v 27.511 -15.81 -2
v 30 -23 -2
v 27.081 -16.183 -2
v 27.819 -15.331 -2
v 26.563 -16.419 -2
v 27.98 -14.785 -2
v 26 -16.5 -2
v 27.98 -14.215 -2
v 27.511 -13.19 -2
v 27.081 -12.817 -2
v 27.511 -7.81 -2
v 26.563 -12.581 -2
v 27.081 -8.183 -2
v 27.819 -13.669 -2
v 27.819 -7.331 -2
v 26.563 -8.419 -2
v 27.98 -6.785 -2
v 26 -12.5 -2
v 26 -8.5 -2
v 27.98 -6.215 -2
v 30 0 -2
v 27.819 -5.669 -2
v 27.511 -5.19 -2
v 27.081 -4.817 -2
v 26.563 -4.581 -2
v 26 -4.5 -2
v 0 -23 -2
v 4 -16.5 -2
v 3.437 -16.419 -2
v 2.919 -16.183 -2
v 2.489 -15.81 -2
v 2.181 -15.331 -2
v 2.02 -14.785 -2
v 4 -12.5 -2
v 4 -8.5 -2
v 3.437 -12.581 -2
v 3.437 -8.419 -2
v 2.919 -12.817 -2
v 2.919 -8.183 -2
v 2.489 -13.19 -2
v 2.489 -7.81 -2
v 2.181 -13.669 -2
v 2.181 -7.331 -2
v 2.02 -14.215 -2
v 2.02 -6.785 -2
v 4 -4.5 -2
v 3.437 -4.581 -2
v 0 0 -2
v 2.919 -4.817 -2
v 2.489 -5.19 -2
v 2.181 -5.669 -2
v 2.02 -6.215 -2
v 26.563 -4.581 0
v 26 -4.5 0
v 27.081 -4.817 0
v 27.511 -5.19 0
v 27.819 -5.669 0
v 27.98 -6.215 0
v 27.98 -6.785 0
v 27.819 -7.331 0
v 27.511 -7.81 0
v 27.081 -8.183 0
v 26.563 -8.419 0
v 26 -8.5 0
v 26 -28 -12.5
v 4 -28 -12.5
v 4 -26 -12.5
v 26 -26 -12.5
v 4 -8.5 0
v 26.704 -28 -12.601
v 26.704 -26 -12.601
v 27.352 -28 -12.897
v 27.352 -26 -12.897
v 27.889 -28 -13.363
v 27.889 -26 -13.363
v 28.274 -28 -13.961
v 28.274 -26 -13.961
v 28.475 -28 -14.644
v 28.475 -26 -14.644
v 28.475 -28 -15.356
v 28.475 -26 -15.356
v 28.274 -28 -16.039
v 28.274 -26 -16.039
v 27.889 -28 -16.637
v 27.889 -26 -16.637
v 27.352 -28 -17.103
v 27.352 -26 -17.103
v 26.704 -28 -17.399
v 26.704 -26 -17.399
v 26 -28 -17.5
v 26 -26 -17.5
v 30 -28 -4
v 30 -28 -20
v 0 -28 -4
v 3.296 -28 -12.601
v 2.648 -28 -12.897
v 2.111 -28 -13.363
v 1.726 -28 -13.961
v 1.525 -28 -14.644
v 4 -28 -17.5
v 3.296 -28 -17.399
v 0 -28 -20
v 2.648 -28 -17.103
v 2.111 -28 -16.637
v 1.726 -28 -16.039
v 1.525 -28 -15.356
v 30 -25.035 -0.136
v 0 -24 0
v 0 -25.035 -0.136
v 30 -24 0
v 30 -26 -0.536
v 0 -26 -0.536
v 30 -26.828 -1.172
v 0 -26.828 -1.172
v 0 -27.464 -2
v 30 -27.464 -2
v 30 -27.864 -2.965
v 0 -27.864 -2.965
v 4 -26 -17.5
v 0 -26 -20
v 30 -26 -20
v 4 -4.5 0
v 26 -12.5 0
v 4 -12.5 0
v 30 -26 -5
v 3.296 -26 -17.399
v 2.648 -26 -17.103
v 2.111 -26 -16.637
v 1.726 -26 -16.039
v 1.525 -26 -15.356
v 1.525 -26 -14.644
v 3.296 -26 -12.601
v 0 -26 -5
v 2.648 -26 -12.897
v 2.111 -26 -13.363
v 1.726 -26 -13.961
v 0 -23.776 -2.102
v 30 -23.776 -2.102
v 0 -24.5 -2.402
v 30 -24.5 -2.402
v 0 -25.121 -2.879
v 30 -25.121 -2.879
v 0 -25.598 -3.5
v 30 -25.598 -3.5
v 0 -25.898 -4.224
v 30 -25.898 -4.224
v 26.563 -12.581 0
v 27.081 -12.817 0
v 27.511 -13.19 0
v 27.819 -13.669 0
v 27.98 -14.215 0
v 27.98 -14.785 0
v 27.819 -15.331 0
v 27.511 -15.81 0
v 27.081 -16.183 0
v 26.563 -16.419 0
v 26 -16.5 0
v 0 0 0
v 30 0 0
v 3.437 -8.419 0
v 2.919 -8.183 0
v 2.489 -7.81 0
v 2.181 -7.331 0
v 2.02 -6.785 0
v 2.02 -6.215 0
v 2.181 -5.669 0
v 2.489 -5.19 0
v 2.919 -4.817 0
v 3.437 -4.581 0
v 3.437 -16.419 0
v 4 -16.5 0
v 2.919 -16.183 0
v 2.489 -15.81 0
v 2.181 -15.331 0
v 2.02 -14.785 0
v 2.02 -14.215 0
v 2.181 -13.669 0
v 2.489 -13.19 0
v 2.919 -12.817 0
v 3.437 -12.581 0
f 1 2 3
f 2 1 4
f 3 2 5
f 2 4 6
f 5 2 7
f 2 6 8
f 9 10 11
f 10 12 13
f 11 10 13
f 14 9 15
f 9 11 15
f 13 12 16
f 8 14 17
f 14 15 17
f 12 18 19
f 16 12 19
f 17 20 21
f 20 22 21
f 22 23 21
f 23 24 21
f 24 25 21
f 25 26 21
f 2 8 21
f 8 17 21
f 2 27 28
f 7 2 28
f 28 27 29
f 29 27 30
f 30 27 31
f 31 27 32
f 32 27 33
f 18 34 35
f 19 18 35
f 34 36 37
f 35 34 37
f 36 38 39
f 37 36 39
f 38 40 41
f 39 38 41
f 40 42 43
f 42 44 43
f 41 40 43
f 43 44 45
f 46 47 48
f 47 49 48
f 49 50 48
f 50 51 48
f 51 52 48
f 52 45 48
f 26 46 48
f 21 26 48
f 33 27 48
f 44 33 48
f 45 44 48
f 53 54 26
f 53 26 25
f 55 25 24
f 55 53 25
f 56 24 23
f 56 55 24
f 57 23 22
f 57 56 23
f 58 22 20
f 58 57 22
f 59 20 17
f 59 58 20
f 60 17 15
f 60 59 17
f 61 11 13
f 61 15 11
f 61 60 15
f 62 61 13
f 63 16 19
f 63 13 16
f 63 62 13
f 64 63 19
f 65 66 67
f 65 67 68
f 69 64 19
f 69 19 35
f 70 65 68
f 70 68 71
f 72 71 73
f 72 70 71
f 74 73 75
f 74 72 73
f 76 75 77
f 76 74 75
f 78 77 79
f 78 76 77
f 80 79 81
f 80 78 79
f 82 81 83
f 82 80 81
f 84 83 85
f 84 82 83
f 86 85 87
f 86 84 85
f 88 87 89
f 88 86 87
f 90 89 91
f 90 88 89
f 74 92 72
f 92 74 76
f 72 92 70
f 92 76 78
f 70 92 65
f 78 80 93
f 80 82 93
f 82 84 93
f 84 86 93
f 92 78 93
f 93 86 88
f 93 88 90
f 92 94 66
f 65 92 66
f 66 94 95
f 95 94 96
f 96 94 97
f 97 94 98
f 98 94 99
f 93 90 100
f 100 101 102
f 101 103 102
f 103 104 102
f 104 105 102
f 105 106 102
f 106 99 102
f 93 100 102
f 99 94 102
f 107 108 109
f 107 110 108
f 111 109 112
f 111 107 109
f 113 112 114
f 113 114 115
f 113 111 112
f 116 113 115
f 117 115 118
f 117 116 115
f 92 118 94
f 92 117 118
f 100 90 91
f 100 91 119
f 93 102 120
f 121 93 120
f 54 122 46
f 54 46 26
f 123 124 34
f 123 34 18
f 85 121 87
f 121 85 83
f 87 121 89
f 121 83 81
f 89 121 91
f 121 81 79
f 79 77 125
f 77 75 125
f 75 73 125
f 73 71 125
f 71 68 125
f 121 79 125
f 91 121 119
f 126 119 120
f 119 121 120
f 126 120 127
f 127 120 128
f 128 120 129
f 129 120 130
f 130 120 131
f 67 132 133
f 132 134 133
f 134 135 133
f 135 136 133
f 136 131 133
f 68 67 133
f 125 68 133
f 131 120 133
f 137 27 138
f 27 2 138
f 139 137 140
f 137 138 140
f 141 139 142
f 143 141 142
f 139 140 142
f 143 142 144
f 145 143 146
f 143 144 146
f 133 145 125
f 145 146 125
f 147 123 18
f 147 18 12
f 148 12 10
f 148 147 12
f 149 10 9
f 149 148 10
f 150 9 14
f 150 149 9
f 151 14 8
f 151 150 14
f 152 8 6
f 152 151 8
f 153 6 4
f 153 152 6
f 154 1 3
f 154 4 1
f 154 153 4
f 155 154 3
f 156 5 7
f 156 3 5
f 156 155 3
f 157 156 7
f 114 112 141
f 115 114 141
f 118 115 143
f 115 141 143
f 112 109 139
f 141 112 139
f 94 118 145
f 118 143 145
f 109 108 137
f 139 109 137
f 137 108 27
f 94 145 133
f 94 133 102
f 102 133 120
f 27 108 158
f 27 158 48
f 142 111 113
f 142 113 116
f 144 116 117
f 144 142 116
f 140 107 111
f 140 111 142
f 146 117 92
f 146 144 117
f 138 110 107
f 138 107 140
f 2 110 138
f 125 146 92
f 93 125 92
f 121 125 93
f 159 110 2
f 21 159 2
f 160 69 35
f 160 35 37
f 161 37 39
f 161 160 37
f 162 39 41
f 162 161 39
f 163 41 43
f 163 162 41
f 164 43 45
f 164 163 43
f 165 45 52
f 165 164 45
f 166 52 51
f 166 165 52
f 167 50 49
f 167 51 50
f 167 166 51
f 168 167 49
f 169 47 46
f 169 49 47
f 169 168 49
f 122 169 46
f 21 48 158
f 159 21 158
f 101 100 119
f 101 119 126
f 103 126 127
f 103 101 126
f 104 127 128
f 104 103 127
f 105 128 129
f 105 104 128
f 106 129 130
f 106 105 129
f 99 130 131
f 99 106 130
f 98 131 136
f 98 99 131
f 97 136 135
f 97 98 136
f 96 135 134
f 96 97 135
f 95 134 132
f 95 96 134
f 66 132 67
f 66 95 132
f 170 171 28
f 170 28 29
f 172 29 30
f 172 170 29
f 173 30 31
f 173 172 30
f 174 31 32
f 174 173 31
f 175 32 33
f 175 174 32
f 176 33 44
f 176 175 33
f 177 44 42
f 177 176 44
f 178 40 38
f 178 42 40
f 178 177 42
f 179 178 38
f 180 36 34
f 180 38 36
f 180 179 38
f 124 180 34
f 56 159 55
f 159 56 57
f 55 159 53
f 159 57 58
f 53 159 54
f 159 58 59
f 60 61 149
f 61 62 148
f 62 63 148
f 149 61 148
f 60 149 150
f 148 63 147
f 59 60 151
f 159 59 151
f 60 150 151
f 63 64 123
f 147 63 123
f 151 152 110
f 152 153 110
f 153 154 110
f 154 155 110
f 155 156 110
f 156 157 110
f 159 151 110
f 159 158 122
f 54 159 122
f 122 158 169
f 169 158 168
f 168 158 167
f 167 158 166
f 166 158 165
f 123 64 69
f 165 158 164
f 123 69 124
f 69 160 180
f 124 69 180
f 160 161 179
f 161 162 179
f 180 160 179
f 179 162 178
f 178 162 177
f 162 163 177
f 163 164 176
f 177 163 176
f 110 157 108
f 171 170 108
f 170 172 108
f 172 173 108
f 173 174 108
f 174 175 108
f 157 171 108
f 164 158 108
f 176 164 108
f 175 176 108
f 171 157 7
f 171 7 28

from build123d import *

# Parameters (mm, degrees)
EXTRUDE_1_DEPTH     = 30
CUT_EXTRUDE_1_DEPTH = 46.650848842
CUT_EXTRUDE_2_DEPTH = 46.650848842
FILLET_2_R          = 4
FILLET_3_R          = 3


with BuildPart() as part:
    # 草图1 → 凸台-拉伸1 (new body)
    with BuildSketch(Plane(origin=(0, 0, 0), x_dir=(0, 0, -1), z_dir=(1, 0, 0))):
        Polygon((0, 0), (0, -17.457543398), (0, -28), (3.576042669, -28), (20, -28), (20, -26), (3.746159887, -26), (2, -26), (2, -18.350485623), (2, 0), align=None)
    extrude(amount=EXTRUDE_1_DEPTH)

    # 草图3 → 切除-拉伸1 (cut, through all)
    with BuildSketch(Plane.XY):
        with BuildLine():
            Line((4, -12.5), (26, -12.5))
            ThreePointArc((26, -12.5), (28, -14.5), (26, -16.5))
            Line((26, -16.5), (4, -16.5))
            ThreePointArc((4, -16.5), (2, -14.5), (4, -12.5))
        make_face()
        with BuildLine():
            Line((4, -4.5), (26, -4.5))
            ThreePointArc((26, -4.5), (28, -6.5), (26, -8.5))
            Line((26, -8.5), (4, -8.5))
            ThreePointArc((4, -8.5), (2, -6.5), (4, -4.5))
        make_face()
    extrude(amount=-CUT_EXTRUDE_1_DEPTH, mode=Mode.SUBTRACT)

    # 草图4 → 切除-拉伸2 (cut, through all)
    with BuildSketch(Plane.XZ.offset(28)):
        with BuildLine():
            Line((4, -12.5), (26, -12.5))
            ThreePointArc((26, -12.5), (28.5, -15), (26, -17.5))
            Line((26, -17.5), (4, -17.5))
            ThreePointArc((4, -17.5), (1.5, -15), (4, -12.5))
        make_face()
    extrude(amount=-CUT_EXTRUDE_2_DEPTH, mode=Mode.SUBTRACT)

    # 圆角2
    fillet_2_edges = [part.edges().sort_by_distance(p)[0] for p in [
        (15, -28, 0),
    ]]
    fillet(fillet_2_edges, radius=FILLET_2_R)

    # 圆角3
    fillet_3_edges = [part.edges().sort_by_distance(p)[0] for p in [
        (15, -26, -2),
    ]]
    fillet(fillet_3_edges, radius=FILLET_3_R)


solid = part.part
